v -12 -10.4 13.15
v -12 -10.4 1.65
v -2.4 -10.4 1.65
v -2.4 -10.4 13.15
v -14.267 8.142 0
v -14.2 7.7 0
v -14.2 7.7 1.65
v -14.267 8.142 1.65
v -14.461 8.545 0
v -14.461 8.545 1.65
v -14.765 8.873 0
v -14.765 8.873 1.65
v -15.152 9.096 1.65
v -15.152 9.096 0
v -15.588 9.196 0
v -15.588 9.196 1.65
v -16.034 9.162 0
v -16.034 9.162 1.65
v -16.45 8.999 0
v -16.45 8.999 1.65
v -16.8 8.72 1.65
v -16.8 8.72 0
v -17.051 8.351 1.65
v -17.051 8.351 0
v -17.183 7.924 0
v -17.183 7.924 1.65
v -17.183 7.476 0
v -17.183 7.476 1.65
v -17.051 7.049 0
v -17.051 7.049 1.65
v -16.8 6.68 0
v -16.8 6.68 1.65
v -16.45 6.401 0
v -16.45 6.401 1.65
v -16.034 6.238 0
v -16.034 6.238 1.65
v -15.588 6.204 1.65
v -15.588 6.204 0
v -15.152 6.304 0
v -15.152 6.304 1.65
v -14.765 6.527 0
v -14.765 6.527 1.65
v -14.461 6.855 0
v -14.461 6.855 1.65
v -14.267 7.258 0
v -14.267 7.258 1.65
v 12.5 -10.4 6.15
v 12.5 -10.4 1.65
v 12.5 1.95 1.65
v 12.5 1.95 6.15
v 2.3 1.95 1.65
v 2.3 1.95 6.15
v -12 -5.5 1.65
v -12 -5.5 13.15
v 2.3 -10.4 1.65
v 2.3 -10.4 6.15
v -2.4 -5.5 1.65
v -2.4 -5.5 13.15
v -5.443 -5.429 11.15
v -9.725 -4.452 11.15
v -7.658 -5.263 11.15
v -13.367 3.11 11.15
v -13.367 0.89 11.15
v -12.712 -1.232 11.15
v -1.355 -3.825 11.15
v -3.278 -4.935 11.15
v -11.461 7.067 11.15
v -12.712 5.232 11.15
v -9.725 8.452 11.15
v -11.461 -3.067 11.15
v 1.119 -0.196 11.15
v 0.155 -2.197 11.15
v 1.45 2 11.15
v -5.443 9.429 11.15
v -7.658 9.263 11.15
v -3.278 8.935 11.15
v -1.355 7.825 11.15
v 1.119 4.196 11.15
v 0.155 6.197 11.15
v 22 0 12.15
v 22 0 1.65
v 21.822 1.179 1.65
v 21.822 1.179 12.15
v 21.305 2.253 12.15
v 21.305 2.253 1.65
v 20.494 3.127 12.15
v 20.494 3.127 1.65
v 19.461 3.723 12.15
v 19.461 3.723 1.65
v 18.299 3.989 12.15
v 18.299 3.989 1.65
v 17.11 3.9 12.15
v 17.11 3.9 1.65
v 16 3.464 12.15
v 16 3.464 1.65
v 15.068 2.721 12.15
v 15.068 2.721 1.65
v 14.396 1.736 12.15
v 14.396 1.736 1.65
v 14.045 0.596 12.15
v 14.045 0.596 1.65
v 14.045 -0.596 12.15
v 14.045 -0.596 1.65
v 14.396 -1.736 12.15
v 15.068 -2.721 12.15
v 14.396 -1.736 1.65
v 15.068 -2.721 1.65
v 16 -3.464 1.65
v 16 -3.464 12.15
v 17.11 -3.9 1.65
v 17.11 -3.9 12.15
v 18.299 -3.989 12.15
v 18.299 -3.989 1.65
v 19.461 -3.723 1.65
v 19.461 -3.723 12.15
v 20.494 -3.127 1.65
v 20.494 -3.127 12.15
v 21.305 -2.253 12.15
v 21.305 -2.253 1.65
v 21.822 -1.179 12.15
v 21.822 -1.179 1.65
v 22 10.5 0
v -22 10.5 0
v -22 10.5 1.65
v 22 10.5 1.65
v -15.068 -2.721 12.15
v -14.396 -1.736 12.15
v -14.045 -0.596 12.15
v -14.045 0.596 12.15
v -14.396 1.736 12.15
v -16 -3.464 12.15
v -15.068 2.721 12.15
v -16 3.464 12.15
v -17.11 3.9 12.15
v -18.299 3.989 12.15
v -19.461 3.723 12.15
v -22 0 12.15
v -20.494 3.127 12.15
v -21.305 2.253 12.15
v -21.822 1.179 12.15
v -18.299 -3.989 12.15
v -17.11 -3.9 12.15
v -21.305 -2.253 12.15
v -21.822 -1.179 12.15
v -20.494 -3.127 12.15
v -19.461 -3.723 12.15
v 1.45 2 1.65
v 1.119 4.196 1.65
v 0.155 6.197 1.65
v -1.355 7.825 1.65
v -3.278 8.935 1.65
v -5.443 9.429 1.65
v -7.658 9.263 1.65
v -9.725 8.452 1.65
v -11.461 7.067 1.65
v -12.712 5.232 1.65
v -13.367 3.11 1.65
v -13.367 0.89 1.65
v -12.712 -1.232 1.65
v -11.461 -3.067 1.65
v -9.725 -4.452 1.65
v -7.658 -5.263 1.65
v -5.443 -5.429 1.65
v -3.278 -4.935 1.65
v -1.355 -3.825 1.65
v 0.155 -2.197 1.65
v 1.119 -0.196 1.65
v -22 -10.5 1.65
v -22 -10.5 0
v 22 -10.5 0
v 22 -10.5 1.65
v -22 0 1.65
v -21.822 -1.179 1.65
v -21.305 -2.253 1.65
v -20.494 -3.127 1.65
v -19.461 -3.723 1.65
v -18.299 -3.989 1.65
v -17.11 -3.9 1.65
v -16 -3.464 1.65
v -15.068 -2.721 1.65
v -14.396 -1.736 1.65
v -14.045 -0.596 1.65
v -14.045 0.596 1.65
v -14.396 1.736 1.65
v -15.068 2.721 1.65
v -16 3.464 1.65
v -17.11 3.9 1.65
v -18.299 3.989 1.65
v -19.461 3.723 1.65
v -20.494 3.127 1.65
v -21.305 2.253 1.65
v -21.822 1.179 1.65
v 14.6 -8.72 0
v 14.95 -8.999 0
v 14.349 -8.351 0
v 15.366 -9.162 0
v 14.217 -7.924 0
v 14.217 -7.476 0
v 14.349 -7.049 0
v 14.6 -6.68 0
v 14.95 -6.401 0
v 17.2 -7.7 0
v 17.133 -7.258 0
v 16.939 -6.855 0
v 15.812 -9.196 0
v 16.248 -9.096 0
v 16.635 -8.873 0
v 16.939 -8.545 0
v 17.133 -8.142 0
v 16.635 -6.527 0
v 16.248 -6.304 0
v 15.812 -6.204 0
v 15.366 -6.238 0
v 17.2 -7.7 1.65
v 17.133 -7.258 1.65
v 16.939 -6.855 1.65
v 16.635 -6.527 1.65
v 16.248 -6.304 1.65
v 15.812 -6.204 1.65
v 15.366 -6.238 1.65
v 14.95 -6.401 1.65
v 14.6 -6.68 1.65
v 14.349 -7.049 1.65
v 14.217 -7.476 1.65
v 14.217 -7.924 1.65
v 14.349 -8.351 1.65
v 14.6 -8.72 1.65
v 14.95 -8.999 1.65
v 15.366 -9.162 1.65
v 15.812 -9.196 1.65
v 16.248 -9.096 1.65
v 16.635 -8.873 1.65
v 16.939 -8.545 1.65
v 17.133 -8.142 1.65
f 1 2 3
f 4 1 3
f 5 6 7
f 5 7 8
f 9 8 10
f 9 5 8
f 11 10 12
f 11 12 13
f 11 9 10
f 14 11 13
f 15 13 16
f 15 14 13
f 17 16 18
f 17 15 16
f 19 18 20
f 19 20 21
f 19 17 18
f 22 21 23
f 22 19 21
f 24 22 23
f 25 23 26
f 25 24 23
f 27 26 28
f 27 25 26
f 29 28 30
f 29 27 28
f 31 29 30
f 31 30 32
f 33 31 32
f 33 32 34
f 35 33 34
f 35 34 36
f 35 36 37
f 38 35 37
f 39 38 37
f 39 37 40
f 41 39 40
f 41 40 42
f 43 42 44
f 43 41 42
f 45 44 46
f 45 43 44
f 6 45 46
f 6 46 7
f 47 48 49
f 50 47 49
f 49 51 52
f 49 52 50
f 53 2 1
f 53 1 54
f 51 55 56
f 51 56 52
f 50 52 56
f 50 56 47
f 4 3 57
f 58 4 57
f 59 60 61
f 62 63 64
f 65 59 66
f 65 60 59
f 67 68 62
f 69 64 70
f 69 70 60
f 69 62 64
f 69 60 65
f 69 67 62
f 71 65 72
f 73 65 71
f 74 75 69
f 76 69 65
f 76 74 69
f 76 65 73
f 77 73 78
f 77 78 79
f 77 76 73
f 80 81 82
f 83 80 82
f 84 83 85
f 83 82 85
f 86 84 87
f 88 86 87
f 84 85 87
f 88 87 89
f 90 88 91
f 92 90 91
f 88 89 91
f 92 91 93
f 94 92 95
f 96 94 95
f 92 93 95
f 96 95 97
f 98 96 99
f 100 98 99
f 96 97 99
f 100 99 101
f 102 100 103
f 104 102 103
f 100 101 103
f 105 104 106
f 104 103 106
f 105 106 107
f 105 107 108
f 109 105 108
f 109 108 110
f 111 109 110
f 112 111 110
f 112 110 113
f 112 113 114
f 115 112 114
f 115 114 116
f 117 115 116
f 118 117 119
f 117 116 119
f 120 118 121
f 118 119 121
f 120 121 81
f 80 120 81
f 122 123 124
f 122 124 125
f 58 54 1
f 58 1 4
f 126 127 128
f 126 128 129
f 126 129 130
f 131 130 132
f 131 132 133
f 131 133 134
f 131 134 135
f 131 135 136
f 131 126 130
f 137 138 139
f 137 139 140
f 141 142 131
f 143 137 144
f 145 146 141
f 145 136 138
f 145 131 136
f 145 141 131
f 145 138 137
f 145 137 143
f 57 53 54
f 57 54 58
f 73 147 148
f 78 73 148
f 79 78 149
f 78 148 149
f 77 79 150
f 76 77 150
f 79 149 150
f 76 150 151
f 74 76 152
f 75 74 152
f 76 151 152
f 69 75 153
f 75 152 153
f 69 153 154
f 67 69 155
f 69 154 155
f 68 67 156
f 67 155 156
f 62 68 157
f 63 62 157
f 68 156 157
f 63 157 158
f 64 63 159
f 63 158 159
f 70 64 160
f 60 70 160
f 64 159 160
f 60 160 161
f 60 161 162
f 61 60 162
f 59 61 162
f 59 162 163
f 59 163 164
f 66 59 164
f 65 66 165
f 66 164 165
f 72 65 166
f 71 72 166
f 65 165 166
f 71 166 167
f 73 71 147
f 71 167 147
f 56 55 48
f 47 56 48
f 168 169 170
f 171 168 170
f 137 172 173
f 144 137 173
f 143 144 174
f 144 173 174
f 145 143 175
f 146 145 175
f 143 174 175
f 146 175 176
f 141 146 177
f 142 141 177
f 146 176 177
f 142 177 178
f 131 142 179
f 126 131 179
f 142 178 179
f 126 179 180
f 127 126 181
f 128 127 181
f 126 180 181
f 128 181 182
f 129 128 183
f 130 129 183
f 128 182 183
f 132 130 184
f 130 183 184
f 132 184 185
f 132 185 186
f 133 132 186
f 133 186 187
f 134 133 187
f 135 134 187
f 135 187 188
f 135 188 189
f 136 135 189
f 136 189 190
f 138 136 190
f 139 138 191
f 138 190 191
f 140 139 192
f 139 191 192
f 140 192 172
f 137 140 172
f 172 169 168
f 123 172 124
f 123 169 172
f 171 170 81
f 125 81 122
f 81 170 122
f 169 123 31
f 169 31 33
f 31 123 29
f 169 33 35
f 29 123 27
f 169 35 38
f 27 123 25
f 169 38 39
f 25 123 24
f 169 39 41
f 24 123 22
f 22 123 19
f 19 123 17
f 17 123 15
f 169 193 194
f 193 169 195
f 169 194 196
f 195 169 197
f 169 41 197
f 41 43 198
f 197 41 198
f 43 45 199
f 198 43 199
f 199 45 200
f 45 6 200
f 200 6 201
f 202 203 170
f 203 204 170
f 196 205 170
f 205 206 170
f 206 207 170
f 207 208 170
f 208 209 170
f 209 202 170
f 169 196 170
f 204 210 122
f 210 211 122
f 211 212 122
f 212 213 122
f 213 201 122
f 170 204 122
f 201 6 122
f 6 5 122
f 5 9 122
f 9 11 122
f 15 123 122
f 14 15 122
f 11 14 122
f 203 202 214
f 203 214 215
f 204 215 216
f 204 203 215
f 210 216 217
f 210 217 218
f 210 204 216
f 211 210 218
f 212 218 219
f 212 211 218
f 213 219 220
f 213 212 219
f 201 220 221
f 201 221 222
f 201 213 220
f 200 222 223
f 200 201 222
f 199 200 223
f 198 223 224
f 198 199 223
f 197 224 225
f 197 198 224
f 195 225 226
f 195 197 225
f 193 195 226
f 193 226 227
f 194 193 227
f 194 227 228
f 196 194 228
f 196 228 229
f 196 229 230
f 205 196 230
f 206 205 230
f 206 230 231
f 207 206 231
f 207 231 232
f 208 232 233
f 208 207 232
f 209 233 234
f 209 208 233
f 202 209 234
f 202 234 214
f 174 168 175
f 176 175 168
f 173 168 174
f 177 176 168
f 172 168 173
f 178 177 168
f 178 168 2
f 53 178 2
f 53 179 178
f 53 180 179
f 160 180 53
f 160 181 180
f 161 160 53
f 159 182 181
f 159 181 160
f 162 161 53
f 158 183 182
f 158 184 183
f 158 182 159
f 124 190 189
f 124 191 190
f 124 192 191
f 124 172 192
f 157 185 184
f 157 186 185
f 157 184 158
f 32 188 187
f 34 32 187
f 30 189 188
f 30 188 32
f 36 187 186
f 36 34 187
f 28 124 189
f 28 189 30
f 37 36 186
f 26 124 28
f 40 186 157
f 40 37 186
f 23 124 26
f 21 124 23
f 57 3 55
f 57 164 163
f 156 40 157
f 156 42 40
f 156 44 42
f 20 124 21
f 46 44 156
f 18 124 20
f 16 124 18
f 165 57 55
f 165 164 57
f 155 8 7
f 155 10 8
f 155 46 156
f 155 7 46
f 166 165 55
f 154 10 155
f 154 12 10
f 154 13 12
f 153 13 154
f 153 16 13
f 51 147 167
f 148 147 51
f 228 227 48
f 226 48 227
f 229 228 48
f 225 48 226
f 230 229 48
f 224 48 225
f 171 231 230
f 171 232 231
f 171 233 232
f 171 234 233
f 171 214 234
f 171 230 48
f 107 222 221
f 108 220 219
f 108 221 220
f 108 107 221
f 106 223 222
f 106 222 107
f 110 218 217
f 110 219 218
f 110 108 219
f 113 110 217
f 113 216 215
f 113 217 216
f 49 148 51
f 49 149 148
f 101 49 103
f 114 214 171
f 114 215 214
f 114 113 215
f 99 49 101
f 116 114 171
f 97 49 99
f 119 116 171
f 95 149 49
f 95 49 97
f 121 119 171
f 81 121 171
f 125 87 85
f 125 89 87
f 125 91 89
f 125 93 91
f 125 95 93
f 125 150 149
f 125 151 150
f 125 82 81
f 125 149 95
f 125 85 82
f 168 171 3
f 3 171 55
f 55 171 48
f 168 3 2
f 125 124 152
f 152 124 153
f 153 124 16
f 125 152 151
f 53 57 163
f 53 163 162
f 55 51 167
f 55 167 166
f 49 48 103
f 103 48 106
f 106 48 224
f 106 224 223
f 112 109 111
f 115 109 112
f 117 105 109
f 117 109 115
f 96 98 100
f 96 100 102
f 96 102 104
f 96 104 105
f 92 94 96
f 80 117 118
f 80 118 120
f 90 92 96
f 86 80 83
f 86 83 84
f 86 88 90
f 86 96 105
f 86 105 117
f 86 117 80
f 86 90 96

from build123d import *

# Parameters (mm, degrees)
SKETCH_1_W         = 44
SKETCH_1_H         = 21
SKETCH_1_R         = 1.5
EXTRUDE_484_DEPTH  = 1.65
SKETCH_2_R         = 4
EXTRUDE_1078_DEPTH = 10.5
SKETCH_2_3_W       = 9.6
SKETCH_2_3_H       = 4.9
EXTRUDE_1123_DEPTH = 11.5
SKETCH_2_4_R       = 7.45
EXTRUDE_1263_DEPTH = 9.5
SKETCH_2_5_W       = 10.2
SKETCH_2_5_H       = 12.35
EXTRUDE_1351_DEPTH = 4.5


with BuildPart() as part:
    # Эскиз1 → Extrude 484 (new body)
    with BuildSketch(Plane.XY):
        Rectangle(SKETCH_1_W, SKETCH_1_H)
        with Locations((-15.7, 7.7)):
            Circle(SKETCH_1_R, mode=Mode.SUBTRACT)
        with Locations((15.7, -7.7)):
            Circle(SKETCH_1_R, mode=Mode.SUBTRACT)
    extrude(amount=EXTRUDE_484_DEPTH)

    # Эскиз2 → Extrude 1078 (add)
    with BuildSketch(Plane.XY.offset(1.65)):
        with Locations((-18, 0)):
            Circle(SKETCH_2_R)
        with Locations((18, 0)):
            Circle(SKETCH_2_R)
    extrude(amount=EXTRUDE_1078_DEPTH)

    # Эскиз2<3> → Extrude 1123 (add)
    with BuildSketch(Plane.XY.offset(1.65)):
        with Locations((-7.2, -7.95)):
            Rectangle(SKETCH_2_3_W, SKETCH_2_3_H)
    extrude(amount=EXTRUDE_1123_DEPTH)

    # Эскиз2<4> → Extrude 1263 (add)
    with BuildSketch(Plane.XY.offset(1.65)):
        with Locations((-6, 2)):
            Circle(SKETCH_2_4_R)
    extrude(amount=EXTRUDE_1263_DEPTH)

    # Эскиз2<5> → Extrude 1351 (add)
    with BuildSketch(Plane.XY.offset(1.65)):
        with Locations((7.4, -4.225)):
            Rectangle(SKETCH_2_5_W, SKETCH_2_5_H)
    extrude(amount=EXTRUDE_1351_DEPTH)


solid = part.part
